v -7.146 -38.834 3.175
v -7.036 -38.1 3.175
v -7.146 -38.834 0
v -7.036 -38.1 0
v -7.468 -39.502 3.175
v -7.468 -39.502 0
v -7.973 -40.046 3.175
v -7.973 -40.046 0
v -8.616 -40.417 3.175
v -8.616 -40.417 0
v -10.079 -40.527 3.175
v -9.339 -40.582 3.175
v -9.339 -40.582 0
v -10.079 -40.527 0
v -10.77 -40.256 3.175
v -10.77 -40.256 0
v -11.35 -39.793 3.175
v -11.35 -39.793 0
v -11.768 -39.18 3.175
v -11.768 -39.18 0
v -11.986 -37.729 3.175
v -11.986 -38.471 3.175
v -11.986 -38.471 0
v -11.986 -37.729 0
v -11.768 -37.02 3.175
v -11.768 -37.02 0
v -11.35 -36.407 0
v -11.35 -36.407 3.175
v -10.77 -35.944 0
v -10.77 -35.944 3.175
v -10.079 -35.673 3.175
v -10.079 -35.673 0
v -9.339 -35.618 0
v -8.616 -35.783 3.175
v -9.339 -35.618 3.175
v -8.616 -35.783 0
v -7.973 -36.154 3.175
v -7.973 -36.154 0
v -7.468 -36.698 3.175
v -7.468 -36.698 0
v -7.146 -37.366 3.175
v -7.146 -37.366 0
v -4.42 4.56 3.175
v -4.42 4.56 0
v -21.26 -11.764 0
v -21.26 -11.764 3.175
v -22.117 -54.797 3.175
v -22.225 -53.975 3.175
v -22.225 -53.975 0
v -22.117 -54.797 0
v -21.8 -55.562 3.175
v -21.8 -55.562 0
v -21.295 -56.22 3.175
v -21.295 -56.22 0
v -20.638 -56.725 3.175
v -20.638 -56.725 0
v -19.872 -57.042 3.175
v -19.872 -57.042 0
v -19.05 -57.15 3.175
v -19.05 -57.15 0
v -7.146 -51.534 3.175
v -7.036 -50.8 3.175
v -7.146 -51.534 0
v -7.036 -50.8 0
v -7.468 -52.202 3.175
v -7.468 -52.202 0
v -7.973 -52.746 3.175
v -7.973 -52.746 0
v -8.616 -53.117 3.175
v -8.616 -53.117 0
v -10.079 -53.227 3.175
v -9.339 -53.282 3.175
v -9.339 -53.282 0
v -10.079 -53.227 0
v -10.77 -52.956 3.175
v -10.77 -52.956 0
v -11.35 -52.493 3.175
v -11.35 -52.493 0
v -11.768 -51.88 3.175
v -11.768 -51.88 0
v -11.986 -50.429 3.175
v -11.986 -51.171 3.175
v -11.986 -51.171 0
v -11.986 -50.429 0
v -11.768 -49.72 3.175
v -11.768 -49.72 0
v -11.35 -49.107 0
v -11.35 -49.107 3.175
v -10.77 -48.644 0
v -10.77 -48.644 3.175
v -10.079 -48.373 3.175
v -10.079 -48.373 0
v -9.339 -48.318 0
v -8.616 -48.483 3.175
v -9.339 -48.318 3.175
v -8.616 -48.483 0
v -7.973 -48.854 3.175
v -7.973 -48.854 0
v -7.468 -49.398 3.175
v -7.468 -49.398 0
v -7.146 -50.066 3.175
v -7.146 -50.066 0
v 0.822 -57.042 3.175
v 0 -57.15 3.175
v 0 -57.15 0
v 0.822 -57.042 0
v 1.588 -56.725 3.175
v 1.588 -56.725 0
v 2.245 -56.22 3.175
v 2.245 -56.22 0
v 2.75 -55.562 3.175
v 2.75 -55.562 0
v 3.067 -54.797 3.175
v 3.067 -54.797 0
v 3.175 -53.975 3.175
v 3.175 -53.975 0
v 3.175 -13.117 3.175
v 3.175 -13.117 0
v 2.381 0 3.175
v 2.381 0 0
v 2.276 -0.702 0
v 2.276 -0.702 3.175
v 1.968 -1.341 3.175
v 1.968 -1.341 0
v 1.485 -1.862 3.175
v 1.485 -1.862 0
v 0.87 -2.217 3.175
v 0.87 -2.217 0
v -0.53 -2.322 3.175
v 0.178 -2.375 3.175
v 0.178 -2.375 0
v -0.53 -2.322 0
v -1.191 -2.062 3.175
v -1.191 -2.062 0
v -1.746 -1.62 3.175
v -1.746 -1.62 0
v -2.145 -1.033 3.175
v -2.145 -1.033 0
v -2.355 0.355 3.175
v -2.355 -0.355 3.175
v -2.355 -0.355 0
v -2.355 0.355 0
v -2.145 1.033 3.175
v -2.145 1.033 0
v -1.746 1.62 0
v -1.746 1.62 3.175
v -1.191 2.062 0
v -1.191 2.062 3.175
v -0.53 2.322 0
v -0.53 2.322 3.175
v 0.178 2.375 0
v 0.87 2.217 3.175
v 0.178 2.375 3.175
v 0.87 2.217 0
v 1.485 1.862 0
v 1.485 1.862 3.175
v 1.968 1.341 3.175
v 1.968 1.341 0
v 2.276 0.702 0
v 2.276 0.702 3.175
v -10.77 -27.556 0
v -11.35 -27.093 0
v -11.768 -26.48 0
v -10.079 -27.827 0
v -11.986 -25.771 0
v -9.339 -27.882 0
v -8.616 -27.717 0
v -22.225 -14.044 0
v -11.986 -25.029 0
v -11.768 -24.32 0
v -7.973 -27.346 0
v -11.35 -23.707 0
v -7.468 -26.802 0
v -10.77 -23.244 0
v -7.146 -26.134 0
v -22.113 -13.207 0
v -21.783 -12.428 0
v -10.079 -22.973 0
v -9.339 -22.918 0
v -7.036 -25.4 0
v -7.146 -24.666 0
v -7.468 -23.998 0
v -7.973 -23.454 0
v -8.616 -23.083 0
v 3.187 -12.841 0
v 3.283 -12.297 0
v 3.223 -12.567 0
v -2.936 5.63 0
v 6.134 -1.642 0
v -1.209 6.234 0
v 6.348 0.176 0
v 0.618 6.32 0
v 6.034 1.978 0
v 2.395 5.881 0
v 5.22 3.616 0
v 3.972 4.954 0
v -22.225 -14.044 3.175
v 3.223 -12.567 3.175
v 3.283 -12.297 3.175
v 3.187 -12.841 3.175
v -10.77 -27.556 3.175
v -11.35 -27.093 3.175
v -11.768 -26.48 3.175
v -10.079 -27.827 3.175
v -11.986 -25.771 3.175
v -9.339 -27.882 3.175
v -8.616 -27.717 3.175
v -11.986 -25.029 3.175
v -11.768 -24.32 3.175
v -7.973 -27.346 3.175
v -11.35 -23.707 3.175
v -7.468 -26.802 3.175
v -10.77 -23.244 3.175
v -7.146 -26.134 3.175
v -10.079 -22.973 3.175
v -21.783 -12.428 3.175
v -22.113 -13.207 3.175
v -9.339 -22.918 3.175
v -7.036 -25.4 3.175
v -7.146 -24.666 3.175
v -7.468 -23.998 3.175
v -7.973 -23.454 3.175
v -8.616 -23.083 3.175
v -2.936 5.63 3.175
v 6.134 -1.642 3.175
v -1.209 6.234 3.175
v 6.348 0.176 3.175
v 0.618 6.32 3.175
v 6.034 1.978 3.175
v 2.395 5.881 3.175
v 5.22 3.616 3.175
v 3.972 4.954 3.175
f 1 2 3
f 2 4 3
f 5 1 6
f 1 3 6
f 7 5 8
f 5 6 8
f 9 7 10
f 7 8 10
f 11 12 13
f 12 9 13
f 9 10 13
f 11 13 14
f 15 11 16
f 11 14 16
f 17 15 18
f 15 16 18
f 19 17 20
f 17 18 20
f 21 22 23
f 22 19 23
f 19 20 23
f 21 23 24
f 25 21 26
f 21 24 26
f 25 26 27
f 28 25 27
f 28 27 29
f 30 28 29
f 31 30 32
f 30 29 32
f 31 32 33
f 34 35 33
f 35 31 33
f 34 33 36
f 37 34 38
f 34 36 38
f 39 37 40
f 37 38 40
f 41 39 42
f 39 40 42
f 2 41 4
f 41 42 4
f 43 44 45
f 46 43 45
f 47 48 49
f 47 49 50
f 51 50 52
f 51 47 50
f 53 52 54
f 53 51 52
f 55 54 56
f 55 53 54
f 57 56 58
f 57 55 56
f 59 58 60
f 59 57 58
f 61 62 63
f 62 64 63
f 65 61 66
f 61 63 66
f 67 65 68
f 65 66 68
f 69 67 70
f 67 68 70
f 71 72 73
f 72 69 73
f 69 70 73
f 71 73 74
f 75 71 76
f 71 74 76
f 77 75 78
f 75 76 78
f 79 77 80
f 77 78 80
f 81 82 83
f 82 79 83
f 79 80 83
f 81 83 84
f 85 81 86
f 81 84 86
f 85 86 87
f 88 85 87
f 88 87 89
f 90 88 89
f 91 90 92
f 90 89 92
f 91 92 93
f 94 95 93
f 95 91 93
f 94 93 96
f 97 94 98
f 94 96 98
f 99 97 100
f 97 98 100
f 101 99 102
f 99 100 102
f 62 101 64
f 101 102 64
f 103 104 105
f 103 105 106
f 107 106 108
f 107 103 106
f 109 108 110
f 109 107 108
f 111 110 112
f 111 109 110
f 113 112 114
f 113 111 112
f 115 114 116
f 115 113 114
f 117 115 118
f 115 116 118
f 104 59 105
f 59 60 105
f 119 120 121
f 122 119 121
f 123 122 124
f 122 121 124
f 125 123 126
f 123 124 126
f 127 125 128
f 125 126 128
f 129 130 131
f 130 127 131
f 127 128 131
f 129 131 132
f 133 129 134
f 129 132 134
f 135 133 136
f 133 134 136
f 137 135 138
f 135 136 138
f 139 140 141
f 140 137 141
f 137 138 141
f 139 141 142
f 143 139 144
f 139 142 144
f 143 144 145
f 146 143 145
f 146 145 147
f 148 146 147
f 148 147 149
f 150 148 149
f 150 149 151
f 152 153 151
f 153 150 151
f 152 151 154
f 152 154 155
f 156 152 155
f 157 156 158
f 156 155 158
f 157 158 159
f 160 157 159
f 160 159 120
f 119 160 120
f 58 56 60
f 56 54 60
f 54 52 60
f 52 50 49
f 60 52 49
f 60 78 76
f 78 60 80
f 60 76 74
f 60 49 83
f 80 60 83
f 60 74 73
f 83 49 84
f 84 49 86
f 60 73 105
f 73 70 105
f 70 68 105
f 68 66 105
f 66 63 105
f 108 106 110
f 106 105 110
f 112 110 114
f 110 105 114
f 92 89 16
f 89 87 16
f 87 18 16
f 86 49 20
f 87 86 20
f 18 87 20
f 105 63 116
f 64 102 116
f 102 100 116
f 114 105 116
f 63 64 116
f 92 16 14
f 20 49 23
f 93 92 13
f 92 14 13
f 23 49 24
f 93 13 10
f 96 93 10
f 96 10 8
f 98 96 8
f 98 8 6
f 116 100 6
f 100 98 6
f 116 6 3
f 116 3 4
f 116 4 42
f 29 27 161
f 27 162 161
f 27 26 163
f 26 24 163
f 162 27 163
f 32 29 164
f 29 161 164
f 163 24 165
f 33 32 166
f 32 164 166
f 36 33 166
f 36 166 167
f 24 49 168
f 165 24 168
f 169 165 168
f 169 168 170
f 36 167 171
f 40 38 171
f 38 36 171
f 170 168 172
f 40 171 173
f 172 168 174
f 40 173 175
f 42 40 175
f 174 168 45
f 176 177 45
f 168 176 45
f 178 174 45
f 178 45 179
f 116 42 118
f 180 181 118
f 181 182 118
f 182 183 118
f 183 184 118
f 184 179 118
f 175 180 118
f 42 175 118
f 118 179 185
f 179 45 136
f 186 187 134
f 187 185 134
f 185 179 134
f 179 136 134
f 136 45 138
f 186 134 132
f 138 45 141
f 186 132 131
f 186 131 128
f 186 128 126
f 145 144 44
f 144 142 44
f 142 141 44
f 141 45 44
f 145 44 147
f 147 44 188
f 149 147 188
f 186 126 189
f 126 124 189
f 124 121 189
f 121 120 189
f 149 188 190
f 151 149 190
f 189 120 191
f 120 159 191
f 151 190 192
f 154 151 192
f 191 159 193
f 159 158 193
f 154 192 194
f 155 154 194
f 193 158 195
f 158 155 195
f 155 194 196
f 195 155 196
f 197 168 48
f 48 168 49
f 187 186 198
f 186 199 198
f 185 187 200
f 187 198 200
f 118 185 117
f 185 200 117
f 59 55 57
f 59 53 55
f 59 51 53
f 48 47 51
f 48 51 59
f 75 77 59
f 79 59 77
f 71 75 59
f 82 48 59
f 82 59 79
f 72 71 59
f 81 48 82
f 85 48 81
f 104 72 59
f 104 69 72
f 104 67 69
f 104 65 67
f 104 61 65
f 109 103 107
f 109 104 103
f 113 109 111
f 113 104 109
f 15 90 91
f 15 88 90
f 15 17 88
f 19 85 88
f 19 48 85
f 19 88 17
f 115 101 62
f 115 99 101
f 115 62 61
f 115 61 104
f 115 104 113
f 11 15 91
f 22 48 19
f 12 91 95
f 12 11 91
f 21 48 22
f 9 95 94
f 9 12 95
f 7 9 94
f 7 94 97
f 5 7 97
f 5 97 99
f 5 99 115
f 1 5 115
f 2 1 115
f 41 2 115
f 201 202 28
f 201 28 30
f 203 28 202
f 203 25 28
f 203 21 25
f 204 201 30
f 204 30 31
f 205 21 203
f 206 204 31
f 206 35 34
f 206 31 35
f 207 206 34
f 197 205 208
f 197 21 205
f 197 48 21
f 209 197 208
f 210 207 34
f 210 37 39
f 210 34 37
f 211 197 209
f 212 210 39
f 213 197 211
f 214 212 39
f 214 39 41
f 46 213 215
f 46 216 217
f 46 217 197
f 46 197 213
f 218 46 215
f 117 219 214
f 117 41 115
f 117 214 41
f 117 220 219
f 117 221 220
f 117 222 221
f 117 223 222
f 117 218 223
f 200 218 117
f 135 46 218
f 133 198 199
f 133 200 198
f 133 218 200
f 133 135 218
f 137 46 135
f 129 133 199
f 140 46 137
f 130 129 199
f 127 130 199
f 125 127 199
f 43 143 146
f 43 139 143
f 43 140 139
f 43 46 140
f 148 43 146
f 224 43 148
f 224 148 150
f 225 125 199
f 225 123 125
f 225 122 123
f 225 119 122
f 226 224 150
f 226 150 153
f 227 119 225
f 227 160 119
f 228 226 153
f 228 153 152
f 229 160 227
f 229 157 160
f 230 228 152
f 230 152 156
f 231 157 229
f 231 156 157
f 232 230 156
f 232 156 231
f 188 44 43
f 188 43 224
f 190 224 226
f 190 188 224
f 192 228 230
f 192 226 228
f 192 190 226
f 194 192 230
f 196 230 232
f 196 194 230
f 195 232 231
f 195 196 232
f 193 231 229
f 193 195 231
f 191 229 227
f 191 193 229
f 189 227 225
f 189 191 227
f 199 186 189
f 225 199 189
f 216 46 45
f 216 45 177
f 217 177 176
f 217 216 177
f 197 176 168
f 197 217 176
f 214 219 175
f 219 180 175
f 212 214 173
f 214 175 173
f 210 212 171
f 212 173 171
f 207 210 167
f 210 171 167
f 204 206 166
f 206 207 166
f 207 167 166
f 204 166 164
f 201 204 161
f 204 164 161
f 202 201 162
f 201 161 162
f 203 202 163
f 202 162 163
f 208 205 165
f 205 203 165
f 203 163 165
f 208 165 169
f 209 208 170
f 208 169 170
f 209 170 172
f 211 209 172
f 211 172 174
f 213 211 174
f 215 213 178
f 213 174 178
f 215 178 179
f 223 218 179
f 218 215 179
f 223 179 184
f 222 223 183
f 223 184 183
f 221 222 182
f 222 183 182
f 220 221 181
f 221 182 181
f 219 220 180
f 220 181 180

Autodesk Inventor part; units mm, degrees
ref_plane "YZ Plane" through (0, 0, 0) normal (1, 0, 0) x (0, 1, 0)
ref_plane "XZ Plane" through (0, 0, 0) normal (0, 1, 0) x (-1, 0, 0)
ref_plane "XY Plane" through (0, 0, 0) normal (0, 0, 1) x (1, 0, 0)
sketch "Sketch1" plane through (0, 0, 0) normal (0, 0, 1) x (1, 0, 0)
  arc A0 (6.1342, -1.6415) -> (-4.4197, 4.5595) centre (0, 0) ccw
  circle A1 centre (0, 0) radius 9.525 construction
  line L0 (3.175, -12.7) -> (-22.225, -12.7)
  line L1 (-22.225, -12.7) -> (-22.225, -63.5)
  line L2 (-22.225, -63.5) -> (3.175, -63.5)
  line L3 (3.175, -63.5) -> (3.175, -12.7)
  line L4 (3.175, -12.7) -> (-22.225, -63.5) construction
  line L5 (-22.225, -12.7) -> (3.175, -63.5) construction
  line L6 (9.525, 7.0623) -> (9.525, -12.9681) construction
  circle A2 centre (-9.525, -25.4) radius 2.4892
  circle A3 centre (-9.525, -38.1) radius 2.4892
  circle A4 centre (-9.525, -50.8) radius 2.4892
  circle A5 centre (0, 0) radius 2.3813
  line L7 (3.175, -12.7) -> (6.1342, -1.6415)
  line L8 (-4.4197, 4.5595) -> (-22.225, -12.7)
  line L9 (3.175, -63.5) -> (-22.225, -63.5)
  line L10 (-22.225, -63.5) -> (-22.225, -57.15)
  line L11 (-22.225, -57.15) -> (3.175, -57.15)
  line L12 (3.175, -57.15) -> (3.175, -63.5)
  line L13 (-22.225, -63.5) -> (-13.843, -63.5)
  line L14 (-13.843, -63.5) -> (-13.843, -44.45)
  line L15 (-13.843, -44.45) -> (-22.225, -44.45)
  line L16 (-22.225, -44.45) -> (-22.225, -63.5)
  point P0 (-13.843, -57.15)
  point P1 (3.175, -57.15)
  dimension "d0" = 12.7
  dimension "d1" = 19.05
  dimension "d2" = 25.4
  dimension "d4" = 6.35
  dimension "d5" = 4.9784
  dimension "d8" = 12.7
  dimension "d13" = 4.7625
  dimension "d17" = 3.175
  dimension "d18" = 12.7
  dimension "d19" = 6.35
  dimension "d20" = 8.382
  dimension "d21" = 19.05
extrude "Extrusion1" add sketch "Sketch1" along normal blind 3.175 contours L7 L0 L8 A0 | L3 L11 L14 L15 L1 L0 | L15 L14 L11 L1
fillet "Fillet1" radius 3.175 4 edges at (3.175, -12.7, 1.5875) (-22.225, -12.7, 1.5875) (3.175, -57.15, 1.5875) (-22.225, -57.15, 1.5875)
properties part number "Top Bearing Plate (R4 - 0.25in Between Stages)" material "Aluminum 6061"
